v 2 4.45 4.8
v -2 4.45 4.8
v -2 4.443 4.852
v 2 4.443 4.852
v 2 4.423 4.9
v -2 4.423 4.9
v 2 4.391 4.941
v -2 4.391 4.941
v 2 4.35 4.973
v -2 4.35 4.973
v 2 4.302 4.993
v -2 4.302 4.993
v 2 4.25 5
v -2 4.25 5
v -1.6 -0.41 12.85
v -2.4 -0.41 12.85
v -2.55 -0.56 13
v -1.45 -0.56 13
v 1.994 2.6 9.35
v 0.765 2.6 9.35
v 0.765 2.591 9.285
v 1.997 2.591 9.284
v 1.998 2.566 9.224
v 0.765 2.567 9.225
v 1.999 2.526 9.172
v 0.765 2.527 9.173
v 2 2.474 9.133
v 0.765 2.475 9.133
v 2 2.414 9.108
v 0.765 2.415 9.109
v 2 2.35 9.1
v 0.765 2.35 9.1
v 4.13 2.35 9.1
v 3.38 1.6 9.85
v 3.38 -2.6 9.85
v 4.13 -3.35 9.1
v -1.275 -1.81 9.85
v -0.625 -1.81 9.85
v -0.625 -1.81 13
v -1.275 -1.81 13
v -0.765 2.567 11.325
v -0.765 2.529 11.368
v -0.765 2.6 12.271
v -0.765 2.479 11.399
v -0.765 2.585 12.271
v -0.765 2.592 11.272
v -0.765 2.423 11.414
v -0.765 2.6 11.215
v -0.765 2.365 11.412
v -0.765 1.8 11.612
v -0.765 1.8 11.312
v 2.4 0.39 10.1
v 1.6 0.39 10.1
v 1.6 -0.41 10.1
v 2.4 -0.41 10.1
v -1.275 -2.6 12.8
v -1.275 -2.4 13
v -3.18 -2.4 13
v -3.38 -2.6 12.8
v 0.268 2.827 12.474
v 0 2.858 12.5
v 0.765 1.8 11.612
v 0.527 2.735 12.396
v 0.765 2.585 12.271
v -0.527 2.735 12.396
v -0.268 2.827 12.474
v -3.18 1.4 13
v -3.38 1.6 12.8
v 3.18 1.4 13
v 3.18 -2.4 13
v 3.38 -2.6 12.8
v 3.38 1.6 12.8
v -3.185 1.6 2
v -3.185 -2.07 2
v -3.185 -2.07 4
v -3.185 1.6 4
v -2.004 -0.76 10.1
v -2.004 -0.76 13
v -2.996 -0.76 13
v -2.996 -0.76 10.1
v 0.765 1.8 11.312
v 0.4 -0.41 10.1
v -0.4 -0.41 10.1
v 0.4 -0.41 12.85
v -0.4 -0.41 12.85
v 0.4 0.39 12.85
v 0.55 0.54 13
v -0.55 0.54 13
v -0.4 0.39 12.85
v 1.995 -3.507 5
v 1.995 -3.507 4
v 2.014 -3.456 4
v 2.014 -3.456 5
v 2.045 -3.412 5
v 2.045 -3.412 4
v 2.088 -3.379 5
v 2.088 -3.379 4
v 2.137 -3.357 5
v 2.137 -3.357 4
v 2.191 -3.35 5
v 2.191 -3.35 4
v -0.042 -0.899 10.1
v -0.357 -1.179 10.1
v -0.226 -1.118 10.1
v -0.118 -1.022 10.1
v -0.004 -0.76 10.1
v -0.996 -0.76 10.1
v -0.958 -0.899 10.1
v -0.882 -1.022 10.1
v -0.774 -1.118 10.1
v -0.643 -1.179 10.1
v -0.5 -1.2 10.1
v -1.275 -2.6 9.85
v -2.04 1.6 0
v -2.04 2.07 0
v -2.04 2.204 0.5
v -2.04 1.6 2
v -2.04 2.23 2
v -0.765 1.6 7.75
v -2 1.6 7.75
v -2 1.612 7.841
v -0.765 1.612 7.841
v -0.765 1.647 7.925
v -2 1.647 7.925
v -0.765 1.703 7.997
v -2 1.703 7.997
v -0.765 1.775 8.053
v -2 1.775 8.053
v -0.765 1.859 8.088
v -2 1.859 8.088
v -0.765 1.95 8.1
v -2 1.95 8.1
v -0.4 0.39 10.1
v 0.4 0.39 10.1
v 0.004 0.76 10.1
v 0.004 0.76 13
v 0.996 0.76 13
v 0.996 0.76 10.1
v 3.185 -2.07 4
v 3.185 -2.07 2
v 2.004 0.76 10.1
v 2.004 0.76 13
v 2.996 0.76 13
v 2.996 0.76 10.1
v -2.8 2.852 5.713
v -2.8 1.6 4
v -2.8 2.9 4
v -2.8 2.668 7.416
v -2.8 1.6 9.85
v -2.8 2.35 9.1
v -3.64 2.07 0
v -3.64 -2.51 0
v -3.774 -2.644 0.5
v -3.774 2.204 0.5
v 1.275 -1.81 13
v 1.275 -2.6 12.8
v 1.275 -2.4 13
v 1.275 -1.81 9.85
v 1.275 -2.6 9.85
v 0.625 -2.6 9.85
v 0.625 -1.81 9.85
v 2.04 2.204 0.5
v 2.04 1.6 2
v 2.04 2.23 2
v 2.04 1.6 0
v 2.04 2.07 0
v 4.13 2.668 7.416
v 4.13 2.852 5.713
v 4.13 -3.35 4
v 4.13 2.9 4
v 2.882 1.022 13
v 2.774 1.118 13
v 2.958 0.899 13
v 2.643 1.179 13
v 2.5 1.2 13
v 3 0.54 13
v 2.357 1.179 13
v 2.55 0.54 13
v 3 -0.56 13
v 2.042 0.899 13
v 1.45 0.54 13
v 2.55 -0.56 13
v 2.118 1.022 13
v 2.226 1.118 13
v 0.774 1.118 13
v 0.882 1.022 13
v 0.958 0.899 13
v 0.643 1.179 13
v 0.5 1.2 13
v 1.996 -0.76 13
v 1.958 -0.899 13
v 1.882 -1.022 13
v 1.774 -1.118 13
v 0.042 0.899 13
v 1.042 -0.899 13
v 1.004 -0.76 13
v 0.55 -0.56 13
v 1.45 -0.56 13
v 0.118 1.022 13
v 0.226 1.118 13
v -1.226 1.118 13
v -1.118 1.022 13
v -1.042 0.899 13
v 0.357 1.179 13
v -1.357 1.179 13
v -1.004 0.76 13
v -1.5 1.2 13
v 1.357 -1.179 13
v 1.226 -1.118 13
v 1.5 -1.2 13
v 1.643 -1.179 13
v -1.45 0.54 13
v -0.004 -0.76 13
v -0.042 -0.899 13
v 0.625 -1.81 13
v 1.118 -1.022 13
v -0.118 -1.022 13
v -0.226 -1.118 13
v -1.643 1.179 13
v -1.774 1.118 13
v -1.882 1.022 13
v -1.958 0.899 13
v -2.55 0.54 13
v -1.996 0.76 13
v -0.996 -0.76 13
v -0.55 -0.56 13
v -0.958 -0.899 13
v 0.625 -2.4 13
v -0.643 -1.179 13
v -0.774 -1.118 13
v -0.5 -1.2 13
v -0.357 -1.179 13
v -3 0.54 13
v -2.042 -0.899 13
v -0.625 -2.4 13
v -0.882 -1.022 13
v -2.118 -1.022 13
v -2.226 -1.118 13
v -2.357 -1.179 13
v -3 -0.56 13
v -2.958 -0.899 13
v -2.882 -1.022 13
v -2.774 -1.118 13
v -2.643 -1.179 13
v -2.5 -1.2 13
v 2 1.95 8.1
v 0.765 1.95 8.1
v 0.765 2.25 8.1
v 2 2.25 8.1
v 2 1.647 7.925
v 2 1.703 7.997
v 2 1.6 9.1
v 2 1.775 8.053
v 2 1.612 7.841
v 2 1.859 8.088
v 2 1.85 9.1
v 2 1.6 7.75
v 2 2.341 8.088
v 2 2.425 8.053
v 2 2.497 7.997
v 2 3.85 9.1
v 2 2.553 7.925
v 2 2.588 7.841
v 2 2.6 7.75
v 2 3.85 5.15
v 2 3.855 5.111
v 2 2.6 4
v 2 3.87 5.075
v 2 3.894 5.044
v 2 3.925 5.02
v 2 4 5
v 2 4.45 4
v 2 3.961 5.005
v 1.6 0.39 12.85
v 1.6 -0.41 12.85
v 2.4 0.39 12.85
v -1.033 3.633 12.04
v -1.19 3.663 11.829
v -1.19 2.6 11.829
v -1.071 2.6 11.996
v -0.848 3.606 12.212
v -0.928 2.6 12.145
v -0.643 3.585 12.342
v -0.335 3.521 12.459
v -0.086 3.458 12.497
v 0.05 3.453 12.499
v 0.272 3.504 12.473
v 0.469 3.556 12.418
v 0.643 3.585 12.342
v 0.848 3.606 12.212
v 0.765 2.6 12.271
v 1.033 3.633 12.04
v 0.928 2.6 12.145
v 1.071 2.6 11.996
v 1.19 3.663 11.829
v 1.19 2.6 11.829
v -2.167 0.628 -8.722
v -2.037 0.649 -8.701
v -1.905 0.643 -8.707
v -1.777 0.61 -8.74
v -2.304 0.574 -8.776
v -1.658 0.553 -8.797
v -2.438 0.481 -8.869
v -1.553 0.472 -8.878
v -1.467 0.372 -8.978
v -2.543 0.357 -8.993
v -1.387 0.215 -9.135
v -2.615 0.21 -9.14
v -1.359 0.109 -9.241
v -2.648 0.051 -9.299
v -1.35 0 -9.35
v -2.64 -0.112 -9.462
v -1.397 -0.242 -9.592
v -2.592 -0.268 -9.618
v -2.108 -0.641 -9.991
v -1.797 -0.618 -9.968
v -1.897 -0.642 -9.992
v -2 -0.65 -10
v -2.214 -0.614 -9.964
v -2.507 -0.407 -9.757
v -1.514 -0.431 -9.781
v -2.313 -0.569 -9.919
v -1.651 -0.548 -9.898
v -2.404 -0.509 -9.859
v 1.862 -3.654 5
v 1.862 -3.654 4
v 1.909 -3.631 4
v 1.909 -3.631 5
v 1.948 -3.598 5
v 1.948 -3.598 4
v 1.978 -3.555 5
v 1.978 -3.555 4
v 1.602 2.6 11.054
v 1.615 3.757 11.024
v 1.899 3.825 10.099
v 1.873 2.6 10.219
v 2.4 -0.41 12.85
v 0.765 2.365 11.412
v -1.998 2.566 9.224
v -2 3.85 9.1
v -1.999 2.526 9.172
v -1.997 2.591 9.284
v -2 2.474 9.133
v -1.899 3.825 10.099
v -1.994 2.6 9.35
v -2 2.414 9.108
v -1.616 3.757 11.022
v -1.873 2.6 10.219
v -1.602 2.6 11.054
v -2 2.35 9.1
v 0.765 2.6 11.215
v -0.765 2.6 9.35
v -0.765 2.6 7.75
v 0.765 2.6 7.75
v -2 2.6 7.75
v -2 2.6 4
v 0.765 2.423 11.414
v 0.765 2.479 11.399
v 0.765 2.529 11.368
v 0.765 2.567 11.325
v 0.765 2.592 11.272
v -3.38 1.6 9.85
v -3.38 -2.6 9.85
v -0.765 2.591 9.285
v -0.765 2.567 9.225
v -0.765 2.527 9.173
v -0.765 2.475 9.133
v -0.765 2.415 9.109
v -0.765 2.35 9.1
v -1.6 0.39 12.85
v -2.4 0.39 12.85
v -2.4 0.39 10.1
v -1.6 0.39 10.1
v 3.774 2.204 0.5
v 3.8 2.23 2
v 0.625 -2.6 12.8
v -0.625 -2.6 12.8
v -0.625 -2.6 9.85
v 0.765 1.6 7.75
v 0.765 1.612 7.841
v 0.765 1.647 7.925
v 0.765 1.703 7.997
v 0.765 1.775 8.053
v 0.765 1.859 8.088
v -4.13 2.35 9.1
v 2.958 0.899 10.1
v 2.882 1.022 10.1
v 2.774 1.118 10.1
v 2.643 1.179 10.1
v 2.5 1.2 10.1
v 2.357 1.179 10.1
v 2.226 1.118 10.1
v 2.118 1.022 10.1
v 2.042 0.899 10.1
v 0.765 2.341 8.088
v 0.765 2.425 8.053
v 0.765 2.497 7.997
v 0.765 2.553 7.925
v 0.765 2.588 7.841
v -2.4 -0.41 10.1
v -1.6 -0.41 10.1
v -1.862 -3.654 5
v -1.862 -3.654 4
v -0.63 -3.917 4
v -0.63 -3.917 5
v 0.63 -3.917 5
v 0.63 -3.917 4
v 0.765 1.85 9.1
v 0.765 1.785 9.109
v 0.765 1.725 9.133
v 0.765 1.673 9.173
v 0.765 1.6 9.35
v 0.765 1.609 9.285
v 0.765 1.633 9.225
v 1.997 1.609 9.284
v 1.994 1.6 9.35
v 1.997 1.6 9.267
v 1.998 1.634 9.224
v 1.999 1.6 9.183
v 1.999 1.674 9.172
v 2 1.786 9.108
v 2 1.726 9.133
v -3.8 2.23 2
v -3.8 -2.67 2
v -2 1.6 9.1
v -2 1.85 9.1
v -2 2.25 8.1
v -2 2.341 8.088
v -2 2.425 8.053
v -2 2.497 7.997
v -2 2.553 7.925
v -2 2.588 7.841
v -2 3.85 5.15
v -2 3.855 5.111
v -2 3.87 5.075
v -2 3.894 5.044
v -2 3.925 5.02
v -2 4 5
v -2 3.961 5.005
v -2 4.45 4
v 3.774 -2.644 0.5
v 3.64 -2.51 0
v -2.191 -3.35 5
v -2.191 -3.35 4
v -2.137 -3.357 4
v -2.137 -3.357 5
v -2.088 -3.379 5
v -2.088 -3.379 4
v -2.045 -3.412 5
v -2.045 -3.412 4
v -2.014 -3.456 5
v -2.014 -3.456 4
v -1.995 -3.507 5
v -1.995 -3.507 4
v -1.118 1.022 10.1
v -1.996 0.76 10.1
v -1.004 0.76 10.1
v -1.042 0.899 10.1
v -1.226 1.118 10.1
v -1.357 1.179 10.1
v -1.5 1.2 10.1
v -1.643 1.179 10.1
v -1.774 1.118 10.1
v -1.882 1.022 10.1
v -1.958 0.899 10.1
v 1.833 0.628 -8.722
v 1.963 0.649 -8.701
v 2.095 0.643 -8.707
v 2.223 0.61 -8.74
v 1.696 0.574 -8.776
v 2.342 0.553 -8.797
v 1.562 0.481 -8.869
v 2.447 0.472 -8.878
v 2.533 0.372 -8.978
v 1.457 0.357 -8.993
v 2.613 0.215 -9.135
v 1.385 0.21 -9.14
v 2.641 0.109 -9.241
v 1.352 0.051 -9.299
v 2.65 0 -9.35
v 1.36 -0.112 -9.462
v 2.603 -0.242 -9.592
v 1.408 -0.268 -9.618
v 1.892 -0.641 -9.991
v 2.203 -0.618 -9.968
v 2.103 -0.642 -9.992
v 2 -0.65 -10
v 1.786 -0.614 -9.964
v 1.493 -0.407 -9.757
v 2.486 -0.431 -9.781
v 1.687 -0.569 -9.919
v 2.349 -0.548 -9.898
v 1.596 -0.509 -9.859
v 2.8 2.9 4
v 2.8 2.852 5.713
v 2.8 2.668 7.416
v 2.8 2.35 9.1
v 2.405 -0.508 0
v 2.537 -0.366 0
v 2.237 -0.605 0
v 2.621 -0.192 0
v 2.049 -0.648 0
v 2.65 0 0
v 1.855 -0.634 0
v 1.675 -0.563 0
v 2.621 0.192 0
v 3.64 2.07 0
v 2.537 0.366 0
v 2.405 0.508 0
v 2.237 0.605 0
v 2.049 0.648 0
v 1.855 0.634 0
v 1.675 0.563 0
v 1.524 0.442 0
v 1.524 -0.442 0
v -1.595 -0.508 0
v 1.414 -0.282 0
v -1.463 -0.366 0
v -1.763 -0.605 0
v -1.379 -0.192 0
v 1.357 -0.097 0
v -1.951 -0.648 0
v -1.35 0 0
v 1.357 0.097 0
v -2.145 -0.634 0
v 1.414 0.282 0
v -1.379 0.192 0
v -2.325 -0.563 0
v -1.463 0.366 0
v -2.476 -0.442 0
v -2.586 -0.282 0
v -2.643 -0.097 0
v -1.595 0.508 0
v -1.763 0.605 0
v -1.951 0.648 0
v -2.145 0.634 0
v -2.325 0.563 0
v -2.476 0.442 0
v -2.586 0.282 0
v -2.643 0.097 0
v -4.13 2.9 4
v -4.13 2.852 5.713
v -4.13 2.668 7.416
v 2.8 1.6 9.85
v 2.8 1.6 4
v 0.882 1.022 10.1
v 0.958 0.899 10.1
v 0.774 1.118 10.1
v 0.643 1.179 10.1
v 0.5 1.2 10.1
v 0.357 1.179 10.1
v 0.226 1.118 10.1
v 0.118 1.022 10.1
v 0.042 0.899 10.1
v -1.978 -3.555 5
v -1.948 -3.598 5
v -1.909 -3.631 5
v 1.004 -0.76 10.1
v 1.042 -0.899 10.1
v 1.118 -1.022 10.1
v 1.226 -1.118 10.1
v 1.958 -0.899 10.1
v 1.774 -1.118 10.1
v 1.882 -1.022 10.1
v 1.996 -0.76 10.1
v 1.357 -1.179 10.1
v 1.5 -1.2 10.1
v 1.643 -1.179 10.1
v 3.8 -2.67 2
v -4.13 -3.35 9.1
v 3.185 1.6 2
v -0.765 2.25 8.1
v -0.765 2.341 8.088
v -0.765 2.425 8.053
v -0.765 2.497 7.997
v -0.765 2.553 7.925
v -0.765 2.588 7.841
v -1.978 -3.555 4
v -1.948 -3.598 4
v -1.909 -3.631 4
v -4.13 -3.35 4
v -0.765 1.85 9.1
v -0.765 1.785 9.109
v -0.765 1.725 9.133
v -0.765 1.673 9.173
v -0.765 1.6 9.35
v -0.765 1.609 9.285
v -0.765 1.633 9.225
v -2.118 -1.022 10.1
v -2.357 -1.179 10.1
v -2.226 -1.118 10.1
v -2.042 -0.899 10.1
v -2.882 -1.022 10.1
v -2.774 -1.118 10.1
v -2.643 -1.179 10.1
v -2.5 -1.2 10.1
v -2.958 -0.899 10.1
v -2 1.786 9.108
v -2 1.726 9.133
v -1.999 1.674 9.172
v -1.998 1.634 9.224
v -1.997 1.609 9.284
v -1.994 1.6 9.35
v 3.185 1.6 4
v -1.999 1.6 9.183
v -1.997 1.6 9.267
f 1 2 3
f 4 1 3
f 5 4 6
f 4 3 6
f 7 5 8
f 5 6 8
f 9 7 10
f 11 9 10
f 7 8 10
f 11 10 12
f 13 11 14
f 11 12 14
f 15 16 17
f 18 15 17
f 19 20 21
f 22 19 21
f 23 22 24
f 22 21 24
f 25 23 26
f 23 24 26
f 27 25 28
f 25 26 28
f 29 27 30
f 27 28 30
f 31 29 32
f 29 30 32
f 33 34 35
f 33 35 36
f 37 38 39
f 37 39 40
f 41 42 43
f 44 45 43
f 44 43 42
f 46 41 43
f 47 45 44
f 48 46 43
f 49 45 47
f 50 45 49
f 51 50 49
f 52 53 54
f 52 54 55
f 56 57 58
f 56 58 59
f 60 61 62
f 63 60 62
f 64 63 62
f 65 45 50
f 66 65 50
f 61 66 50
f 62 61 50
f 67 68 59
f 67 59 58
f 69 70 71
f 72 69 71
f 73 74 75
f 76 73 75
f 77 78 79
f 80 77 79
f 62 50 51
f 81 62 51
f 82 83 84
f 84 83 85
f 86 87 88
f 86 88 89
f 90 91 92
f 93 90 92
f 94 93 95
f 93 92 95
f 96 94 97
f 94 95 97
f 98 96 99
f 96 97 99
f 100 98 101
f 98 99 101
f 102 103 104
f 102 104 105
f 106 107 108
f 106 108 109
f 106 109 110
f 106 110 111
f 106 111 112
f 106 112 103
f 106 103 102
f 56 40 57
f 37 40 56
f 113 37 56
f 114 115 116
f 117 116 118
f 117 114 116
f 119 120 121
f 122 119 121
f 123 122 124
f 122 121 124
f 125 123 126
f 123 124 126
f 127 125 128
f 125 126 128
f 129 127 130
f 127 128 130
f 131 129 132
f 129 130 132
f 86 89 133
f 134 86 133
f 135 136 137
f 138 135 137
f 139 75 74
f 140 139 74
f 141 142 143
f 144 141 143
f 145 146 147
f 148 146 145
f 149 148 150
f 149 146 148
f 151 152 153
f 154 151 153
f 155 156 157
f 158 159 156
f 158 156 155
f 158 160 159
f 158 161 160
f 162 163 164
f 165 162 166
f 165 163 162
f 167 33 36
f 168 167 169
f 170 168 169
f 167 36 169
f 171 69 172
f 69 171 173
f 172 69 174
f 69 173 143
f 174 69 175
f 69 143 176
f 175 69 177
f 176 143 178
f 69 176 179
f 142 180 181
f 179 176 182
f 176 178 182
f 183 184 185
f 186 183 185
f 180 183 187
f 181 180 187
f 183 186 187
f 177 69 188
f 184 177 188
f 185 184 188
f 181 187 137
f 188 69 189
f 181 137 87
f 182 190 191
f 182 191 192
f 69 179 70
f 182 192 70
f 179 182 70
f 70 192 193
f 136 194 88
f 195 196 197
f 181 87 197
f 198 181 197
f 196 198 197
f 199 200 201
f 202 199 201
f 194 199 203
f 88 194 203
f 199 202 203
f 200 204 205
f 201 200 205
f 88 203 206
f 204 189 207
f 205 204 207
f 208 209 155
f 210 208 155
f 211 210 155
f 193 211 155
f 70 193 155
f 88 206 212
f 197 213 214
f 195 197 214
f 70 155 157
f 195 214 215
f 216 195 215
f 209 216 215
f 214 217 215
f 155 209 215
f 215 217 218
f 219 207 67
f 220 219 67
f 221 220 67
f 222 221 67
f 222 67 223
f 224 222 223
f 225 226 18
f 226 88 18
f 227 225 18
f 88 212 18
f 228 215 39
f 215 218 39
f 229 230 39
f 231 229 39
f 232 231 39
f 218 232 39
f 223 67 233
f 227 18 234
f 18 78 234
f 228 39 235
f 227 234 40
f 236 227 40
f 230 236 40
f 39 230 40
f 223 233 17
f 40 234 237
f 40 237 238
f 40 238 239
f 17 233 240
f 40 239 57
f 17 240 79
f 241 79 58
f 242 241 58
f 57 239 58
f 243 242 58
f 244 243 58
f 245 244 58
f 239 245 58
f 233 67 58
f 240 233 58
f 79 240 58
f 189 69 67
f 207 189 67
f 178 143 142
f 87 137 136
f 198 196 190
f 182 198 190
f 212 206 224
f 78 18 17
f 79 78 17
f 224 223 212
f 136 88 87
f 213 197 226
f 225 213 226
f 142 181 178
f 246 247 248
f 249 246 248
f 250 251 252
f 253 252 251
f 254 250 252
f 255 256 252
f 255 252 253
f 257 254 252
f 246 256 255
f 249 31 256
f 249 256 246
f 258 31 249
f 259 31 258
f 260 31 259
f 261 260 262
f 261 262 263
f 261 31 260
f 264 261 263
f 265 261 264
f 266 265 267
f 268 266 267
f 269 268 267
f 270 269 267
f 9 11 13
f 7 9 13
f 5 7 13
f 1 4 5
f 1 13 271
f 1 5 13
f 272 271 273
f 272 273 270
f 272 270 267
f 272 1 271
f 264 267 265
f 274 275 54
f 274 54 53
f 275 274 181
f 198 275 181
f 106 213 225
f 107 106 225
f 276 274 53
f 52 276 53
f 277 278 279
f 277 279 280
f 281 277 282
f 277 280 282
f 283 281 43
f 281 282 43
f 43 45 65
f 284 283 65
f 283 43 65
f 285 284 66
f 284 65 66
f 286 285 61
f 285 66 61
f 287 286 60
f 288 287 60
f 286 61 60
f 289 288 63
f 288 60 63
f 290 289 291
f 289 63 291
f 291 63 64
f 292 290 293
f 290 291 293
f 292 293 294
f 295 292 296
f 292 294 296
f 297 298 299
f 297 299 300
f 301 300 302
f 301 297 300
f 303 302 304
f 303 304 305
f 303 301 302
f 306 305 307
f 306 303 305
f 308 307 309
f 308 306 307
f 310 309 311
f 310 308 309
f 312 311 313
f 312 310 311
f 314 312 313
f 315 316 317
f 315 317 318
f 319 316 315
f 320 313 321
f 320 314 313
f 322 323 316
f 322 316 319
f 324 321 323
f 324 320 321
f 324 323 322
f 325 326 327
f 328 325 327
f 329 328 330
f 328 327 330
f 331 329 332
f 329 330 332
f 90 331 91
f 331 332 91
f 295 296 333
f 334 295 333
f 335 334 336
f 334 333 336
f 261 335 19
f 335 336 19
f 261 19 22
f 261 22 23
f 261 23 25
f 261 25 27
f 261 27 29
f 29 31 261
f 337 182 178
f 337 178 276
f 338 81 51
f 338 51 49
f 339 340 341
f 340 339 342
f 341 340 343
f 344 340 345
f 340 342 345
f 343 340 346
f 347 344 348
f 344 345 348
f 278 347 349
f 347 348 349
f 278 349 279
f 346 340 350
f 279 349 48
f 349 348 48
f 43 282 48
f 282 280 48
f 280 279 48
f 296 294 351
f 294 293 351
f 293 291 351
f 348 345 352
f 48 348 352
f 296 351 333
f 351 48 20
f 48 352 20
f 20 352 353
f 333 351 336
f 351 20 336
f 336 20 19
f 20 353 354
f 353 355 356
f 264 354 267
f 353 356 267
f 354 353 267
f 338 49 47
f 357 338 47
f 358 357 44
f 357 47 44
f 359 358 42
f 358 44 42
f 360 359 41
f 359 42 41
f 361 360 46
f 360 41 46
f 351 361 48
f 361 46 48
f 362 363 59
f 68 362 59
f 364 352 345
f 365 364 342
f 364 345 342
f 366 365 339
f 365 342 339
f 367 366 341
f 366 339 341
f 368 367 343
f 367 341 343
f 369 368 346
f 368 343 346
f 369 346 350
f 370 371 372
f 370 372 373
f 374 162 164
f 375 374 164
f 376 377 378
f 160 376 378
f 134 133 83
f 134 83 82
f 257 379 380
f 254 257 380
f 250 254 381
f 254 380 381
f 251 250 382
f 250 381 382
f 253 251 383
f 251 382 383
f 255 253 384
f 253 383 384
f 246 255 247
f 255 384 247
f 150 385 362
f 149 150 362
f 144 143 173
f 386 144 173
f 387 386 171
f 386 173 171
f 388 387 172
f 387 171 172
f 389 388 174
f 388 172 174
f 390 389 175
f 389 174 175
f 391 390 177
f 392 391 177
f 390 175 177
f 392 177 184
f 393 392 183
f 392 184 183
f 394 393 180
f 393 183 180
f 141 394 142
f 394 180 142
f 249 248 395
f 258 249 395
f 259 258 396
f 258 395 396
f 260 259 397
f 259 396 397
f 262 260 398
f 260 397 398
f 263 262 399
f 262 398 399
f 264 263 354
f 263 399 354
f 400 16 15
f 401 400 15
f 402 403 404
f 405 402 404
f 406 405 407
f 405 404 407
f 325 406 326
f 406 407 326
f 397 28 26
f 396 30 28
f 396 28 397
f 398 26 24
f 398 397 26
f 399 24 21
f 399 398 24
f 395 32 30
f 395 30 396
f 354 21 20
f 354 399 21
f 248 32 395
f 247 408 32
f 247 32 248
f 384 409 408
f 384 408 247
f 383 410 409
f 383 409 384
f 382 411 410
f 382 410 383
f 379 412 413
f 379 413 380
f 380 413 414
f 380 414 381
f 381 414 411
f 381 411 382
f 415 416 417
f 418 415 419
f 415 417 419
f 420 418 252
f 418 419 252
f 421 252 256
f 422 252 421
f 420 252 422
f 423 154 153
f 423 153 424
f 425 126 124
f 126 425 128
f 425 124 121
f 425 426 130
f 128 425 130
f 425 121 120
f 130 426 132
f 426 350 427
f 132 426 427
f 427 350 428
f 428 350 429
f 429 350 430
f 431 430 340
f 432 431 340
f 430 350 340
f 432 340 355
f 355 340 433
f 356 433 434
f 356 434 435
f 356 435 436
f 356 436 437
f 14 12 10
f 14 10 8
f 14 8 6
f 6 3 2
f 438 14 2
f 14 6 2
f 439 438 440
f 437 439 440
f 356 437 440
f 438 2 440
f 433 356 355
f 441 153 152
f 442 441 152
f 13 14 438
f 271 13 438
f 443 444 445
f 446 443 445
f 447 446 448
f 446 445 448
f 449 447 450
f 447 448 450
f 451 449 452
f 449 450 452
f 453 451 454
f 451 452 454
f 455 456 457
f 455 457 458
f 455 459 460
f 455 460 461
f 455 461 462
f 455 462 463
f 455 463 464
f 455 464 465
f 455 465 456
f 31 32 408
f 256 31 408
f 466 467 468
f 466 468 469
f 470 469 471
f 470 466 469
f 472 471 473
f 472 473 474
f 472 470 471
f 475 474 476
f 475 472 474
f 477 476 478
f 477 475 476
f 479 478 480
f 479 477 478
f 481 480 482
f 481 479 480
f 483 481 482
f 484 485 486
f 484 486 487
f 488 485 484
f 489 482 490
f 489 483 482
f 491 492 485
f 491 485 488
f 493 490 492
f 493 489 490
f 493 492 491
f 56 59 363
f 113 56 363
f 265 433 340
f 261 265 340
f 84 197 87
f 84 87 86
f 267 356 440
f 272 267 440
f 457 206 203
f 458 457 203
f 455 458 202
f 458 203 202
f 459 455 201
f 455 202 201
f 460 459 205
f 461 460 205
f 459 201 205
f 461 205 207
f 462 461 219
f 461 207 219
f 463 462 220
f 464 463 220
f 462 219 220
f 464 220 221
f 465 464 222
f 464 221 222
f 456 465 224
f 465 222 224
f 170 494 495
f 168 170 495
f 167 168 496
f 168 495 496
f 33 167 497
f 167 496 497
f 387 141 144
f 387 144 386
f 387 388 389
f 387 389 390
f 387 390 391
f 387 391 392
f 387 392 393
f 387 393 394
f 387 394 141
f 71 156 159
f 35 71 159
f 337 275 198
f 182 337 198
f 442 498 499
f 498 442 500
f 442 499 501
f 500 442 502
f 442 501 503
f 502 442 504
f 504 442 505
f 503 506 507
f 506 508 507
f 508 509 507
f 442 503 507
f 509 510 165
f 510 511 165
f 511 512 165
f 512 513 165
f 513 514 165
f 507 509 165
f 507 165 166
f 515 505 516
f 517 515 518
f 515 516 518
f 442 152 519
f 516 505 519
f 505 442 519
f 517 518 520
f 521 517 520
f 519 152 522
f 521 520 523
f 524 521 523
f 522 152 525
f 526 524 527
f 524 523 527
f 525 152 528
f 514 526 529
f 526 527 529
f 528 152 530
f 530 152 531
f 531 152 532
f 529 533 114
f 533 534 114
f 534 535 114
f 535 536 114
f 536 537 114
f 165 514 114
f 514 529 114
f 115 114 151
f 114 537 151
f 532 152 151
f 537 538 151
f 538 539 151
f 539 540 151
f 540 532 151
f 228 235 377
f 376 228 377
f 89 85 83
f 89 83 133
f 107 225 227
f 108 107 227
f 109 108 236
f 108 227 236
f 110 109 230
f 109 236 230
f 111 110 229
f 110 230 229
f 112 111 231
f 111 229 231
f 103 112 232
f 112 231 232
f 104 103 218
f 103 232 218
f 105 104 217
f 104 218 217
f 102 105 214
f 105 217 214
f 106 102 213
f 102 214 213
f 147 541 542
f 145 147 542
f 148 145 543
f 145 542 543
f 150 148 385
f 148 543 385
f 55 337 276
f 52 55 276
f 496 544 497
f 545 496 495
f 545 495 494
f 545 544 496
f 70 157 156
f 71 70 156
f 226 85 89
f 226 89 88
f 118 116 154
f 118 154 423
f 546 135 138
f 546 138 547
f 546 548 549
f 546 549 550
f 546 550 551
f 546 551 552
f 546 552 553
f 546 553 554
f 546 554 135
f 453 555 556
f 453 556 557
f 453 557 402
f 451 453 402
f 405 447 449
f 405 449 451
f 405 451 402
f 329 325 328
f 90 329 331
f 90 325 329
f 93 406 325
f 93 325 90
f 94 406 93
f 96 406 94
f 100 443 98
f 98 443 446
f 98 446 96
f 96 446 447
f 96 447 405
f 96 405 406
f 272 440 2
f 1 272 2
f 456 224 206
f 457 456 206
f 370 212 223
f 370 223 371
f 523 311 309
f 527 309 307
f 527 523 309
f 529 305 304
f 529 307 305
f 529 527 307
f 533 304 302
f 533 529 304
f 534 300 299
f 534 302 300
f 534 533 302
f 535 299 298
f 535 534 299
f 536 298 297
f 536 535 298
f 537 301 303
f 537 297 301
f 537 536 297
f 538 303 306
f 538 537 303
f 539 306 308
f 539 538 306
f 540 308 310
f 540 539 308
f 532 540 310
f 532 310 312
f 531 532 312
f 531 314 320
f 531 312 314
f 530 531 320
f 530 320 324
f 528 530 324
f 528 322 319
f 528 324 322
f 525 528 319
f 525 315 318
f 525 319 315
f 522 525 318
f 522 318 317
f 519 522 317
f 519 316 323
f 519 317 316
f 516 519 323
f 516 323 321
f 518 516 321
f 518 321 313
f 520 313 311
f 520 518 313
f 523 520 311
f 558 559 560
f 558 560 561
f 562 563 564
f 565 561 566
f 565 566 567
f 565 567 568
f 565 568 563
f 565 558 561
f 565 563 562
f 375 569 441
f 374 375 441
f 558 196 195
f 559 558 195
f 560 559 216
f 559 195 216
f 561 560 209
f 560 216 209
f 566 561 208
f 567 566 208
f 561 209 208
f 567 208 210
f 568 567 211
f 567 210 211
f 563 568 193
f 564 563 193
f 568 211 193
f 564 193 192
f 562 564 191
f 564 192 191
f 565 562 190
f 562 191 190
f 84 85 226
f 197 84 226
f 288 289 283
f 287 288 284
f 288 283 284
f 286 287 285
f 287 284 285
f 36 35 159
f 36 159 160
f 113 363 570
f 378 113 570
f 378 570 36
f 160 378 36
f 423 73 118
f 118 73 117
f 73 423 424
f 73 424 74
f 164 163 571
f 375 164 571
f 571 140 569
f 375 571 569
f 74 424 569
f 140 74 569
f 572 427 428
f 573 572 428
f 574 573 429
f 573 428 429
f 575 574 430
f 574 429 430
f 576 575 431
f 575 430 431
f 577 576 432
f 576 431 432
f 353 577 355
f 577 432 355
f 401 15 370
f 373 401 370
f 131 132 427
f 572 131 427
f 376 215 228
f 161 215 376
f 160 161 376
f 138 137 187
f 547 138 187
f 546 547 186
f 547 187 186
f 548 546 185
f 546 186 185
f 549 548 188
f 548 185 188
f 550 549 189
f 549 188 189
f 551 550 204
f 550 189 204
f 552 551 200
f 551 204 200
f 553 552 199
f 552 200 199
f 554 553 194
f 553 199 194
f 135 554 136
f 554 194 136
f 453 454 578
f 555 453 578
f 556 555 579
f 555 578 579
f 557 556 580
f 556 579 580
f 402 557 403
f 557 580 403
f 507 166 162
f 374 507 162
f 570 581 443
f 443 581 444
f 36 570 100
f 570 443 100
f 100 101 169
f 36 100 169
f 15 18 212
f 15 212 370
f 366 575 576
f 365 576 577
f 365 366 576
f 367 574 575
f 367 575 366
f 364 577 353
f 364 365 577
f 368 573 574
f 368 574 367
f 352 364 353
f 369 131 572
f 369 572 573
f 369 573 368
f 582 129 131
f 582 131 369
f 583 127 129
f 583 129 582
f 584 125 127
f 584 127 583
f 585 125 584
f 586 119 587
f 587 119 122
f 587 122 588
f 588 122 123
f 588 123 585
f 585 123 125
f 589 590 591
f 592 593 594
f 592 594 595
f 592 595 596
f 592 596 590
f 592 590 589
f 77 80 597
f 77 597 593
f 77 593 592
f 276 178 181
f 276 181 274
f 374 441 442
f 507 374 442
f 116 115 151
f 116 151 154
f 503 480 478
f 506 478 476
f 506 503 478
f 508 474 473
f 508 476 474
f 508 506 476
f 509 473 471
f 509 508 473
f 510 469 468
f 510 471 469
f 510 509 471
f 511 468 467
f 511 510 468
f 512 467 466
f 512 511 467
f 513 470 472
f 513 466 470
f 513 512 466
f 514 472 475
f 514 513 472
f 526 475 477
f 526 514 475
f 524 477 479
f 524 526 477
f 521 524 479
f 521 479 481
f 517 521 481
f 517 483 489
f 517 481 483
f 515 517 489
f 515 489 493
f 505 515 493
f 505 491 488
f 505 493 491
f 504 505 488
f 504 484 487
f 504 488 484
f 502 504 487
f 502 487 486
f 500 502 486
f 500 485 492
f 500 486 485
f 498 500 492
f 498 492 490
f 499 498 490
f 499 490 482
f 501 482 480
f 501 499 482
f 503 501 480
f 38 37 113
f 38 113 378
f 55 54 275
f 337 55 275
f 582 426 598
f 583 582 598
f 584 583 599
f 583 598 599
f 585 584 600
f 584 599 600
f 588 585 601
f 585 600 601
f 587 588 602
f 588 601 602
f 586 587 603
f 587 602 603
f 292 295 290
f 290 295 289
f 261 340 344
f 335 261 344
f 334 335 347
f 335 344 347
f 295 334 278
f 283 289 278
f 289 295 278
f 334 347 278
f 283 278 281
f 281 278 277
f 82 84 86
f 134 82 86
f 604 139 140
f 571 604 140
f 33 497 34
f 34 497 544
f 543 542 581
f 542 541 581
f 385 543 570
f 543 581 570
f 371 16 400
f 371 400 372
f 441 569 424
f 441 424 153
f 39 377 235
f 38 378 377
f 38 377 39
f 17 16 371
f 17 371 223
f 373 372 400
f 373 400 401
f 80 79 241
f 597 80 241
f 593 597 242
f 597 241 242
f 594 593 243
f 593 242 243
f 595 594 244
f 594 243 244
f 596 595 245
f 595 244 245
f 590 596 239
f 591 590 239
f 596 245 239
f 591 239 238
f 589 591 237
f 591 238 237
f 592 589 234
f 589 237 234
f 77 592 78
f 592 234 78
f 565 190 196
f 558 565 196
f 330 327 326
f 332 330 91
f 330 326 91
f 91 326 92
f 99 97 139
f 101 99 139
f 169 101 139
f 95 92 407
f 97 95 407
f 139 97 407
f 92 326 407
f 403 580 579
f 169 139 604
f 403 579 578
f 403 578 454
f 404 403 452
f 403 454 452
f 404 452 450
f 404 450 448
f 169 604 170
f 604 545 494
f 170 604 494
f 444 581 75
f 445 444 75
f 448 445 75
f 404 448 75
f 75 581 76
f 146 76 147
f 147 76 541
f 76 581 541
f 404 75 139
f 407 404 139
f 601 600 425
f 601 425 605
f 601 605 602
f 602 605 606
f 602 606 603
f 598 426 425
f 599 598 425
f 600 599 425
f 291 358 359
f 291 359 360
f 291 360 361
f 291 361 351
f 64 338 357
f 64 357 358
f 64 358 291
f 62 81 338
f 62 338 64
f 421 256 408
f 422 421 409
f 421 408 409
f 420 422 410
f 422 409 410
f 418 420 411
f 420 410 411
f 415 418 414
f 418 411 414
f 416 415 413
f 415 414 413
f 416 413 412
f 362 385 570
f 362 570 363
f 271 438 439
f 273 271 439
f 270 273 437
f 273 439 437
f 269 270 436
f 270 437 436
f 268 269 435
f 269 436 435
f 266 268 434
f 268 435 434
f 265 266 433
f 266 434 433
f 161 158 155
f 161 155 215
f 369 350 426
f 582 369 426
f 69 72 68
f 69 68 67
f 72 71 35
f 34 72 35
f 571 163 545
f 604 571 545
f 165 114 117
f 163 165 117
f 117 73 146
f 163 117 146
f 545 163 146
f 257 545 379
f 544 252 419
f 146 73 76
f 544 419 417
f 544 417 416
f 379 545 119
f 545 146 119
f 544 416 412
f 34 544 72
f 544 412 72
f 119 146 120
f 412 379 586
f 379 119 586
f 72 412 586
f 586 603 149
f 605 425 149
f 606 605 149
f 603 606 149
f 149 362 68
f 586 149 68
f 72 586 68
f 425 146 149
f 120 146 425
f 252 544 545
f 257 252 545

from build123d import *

# Parameters (mm, degrees)
BOSS_EXTRUDE1_DEPTH      = 4.15
BOSS_EXTRUDE1_DEPTH_BACK = 4.15
CUT_EXTRUDE1_DEPTH       = 6
CUT_EXTRUDE1_DEPTH_BACK  = 6
SKETCH2_W                = 10
SKETCH2_H                = 15
CUT_EXTRUDE2_DEPTH       = 2
BOSS_EXTRUDE2_DEPTH      = 2
BOSS_EXTRUDE2_DEPTH_BACK = 2
SKETCH5_W                = 4.4
SKETCH5_H                = 9
CUT_EXTRUDE3_DEPTH       = 3
CUT_EXTRUDE4_DEPTH       = 1
BOSS_EXTRUDE3_DEPTH      = 1
CUT_EXTRUDE5_DEPTH       = 3.2
SKETCH9_W                = 0.8
SKETCH9_H                = 0.8
CUT_EXTRUDE6_DEPTH       = 2.9
SKETCH10_W               = 0.8
SKETCH10_H               = 0.8
CUT_EXTRUDE7_DEPTH       = 2.9
SKETCH11_W               = 0.8
SKETCH11_H               = 0.8
CUT_EXTRUDE8_DEPTH       = 2.9
CUT_EXTRUDE9_DEPTH       = 2.9
CUT_EXTRUDE10_DEPTH      = 2.9
CUT_EXTRUDE11_DEPTH      = 2.9
CUT_EXTRUDE12_DEPTH      = 2.9
CUT_EXTRUDE13_DEPTH      = 2.9
CUT_EXTRUDE14_DEPTH      = 2.9
CUT_EXTRUDE15_DEPTH      = 1.1
BOSS_EXTRUDE4_DEPTH      = 3
BOSS_EXTRUDE4_DEPTH_BACK = 3
SKETCH20_R               = 0.65
BOSS_EXTRUDE5_DEPTH      = 10
SKETCH21_R               = 0.65
BOSS_EXTRUDE6_DEPTH      = 10
CUT_EXTRUDE16_DEPTH      = 3
CUT_EXTRUDE16_DEPTH_BACK = 3


with BuildPart() as part:
    # Sketch1 → Boss-Extrude1 (new, two sides: drawn at the far end of the back side and taken through both)
    with BuildSketch(Plane(origin=(0, 0, 0), x_dir=(0, 0, -1), z_dir=(1, 0, 0)).offset(-BOSS_EXTRUDE1_DEPTH_BACK)):
        with BuildLine():
            Line((-13, 1.4), (-13, -2.4))
            Line((-13, -2.4), (-12.8, -2.6))
            Line((-12.8, -2.6), (-9.85, -2.6))
            Line((-9.85, -2.6), (-9.1, -3.35))
            Line((-9.1, -3.35), (-4, -3.35))
            Line((-4, -3.35), (-4, -2.07))
            Line((-4, -2.07), (-2, -2.07))
            Line((-2, -2.07), (-2, -2.67))
            Line((-2, -2.67), (-0.5, -2.643817403))
            Line((-0.5, -2.643817403), (0, -2.509842806))
            Line((0, -2.509842806), (0, 2.069842806))
            Line((0, 2.069842806), (-0.5, 2.203817403))
            Line((-0.5, 2.203817403), (-2, 2.23))
            Line((-2, 2.23), (-2, 1.6))
            Line((-2, 1.6), (-4, 1.6))
            Line((-4, 1.6), (-4, 2.9))
            ThreePointArc((-4, 2.9), (-6.566392361, 2.777001893), (-9.1, 2.35))
            Line((-9.1, 2.35), (-9.85, 1.6))
            Line((-9.85, 1.6), (-12.8, 1.6))
            Line((-12.8, 1.6), (-13, 1.4))
        make_face()
    extrude(amount=BOSS_EXTRUDE1_DEPTH + BOSS_EXTRUDE1_DEPTH_BACK)

    # Sketch2 → Cut-Extrude1 (cut, two sides: drawn at the far end of the back side and taken through both)
    with BuildSketch(Plane(origin=(0, 0, 0), x_dir=(1, 0, 0), z_dir=(0, 1, 0)).offset(-CUT_EXTRUDE1_DEPTH_BACK)):
        with Locations((0, -6.5)):
            Rectangle(SKETCH2_W, SKETCH2_H)
        Polygon((-4.13, -9.1), (-3.38, -9.85), (-3.38, -12.8), (-3.18, -13), (3.18, -13), (3.38, -12.8), (3.38, -9.85), (4.13, -9.1), (4.13, -4), (3.185, -4), (3.185, -2), (3.8, -2), (3.773817403, -0.5), (3.639842806, 0), (-3.639842806, 0), (-3.773817403, -0.5), (-3.8, -2), (-3.185, -2), (-3.185, -4), (-4.13, -4), align=None, mode=Mode.SUBTRACT)
    extrude(amount=CUT_EXTRUDE1_DEPTH + CUT_EXTRUDE1_DEPTH_BACK, mode=Mode.SUBTRACT)

    # Sketch3 → Cut-Extrude2 (cut)
    with BuildSketch(Plane(origin=(0, 1.6, 0), x_dir=(1, 0, 0), z_dir=(0, 1, 0))):
        Polygon((-2.8, -4), (-2.8, -13), (2.8, -13), (2.8, -4), (2.04, -4), (2.04, 0), (-2.04, 0), (-2.04, -4), align=None)
    extrude(amount=CUT_EXTRUDE2_DEPTH, mode=Mode.SUBTRACT)

    # Sketch4 → Boss-Extrude2 (add, two sides: drawn at the far end of the back side and taken through both)
    with BuildSketch(Plane(origin=(0, 0, 0), x_dir=(0, 0, -1), z_dir=(1, 0, 0)).offset(-BOSS_EXTRUDE2_DEPTH_BACK)):
        with BuildLine():
            Line((-12.51, 3.388062852), (-12.51, 2.87))
            Line((-12.51, 2.87), (-11.612163395, 1.8))
            Line((-11.612163395, 1.8), (-11.312163395, 1.8))
            Line((-11.312163395, 1.8), (-11.411835811, 2.365270364))
            ThreePointArc((-11.411835811, 2.365270364), (-11.368083149, 2.528557522), (-11.214874261, 2.6))
            Line((-11.214874261, 2.6), (-9.35, 2.6))
            ThreePointArc((-9.35, 2.6), (-9.173223305, 2.526776695), (-9.1, 2.35))
            Line((-9.1, 2.35), (-9.1, 1.85))
            ThreePointArc((-9.1, 1.85), (-9.173223305, 1.673223305), (-9.35, 1.6))
            Line((-9.35, 1.6), (-9.35, 0.6))
            Line((-9.35, 0.6), (-7.75, 0.6))
            Line((-7.75, 0.6), (-7.75, 1.6))
            ThreePointArc((-7.75, 1.6), (-7.997487373, 1.702512627), (-8.1, 1.95))
            Line((-8.1, 1.95), (-8.1, 2.25))
            ThreePointArc((-8.1, 2.25), (-7.997487373, 2.497487373), (-7.75, 2.6))
            Line((-7.75, 2.6), (-4, 2.6))
            Line((-4, 2.6), (-4, 4.45))
            Line((-4, 4.45), (-4.8, 4.45))
            ThreePointArc((-4.8, 4.45), (-4.941421356, 4.391421356), (-5, 4.25))
            Line((-5, 4.25), (-5, 4))
            ThreePointArc((-5, 4), (-5.043933983, 3.893933983), (-5.15, 3.85))
            Line((-5.15, 3.85), (-9.1, 3.85))
            ThreePointArc((-9.1, 3.85), (-10.726600682, 3.783744511), (-12.342424242, 3.585417022))
            ThreePointArc((-12.342424242, 3.585417022), (-12.462454663, 3.517513907), (-12.51, 3.388062852))
        make_face()
    extrude(amount=BOSS_EXTRUDE2_DEPTH + BOSS_EXTRUDE2_DEPTH_BACK)

    # Sketch5 → Cut-Extrude3 (cut)
    with BuildSketch(Plane(origin=(0, 1.6, 0), x_dir=(1, 0, 0), z_dir=(0, 1, 0))):
        with Locations((0, -8.3)):
            Rectangle(SKETCH5_W, SKETCH5_H)
        with BuildLine():
            Line((2, -9.1), (2, -4))
            Line((2, -4), (-2, -4))
            Line((-2, -4), (-2, -9.1))
            ThreePointArc((-2, -9.1), (-1.793181663, -10.523168838), (-1.189836183, -11.828602712))
            ThreePointArc((-1.189836183, -11.828602712), (0, -12.5), (1.189836183, -11.828602712))
            ThreePointArc((1.189836183, -11.828602712), (1.793181663, -10.523168838), (2, -9.1))
        make_face(mode=Mode.SUBTRACT)
    extrude(amount=CUT_EXTRUDE3_DEPTH, mode=Mode.SUBTRACT)

    # Sketch6 → Cut-Extrude4 (cut)
    with BuildSketch(Plane(origin=(0, 1.6, 0), x_dir=(1, 0, 0), z_dir=(0, 1, 0))):
        Polygon((-2, -10.5), (-2, -13), (-0.765, -13), (-0.765, -10.7), (0.765, -10.7), (0.765, -13), (2, -13), (2, -10.5), (0.765, -10.5), (0.765, -4), (2, -4), (2, -3), (-2, -3), (-2, -4), (-0.765, -4), (-0.765, -10.5), align=None)
    extrude(amount=CUT_EXTRUDE4_DEPTH, mode=Mode.SUBTRACT)

    # Sketch7 → Boss-Extrude3 (add)
    with BuildSketch(Plane.XY.offset(4)):
        with BuildLine():
            Line((-2.3, -3.35), (-2.190561659, -3.35))
            ThreePointArc((-2.190561659, -3.35), (-2.065337959, -3.394054417), (-1.995280829, -3.50680975))
            ThreePointArc((-1.995280829, -3.50680975), (-1.948171085, -3.597952406), (-1.862068966, -3.653744311))
            ThreePointArc((-1.862068966, -3.653744311), (0, -3.95), (1.862068966, -3.653744311))
            ThreePointArc((1.862068966, -3.653744311), (1.948171087, -3.597952405), (1.99528083, -3.506809747))
            ThreePointArc((1.99528083, -3.506809747), (2.06533796, -3.394054416), (2.190561659, -3.35))
            Line((2.190561659, -3.35), (2.3, -3.35))
            Line((2.3, -3.35), (2, 0))
            Line((2, 0), (-2, 0))
            Line((-2, 0), (-2.3, -3.35))
        make_face()
    extrude(amount=BOSS_EXTRUDE3_DEPTH)

    # Sketch8 → Cut-Extrude5 (cut)
    with BuildSketch(Plane.XY.offset(9.85)):
        Polygon((-1.275, -1.81), (-1.275, -3.41), (1.275, -3.41), (1.275, -1.81), (0.625, -1.81), (0.625, -2.61), (-0.625, -2.61), (-0.625, -1.81), align=None)
    extrude(amount=CUT_EXTRUDE5_DEPTH, mode=Mode.SUBTRACT)

    # Sketch9 → Cut-Extrude6 (cut)
    with BuildSketch(Plane.XY.offset(13)):
        with Locations((-2, -0.01)):
            Rectangle(SKETCH9_W, SKETCH9_H)
    extrude(amount=-CUT_EXTRUDE6_DEPTH, mode=Mode.SUBTRACT)

    # Sketch10 → Cut-Extrude7 (cut)
    with BuildSketch(Plane.XY.offset(13)):
        with Locations((0, -0.01)):
            Rectangle(SKETCH10_W, SKETCH10_H)
    extrude(amount=-CUT_EXTRUDE7_DEPTH, mode=Mode.SUBTRACT)

    # Sketch11 → Cut-Extrude8 (cut)
    with BuildSketch(Plane.XY.offset(13)):
        with Locations((2, -0.01)):
            Rectangle(SKETCH11_W, SKETCH11_H)
    extrude(amount=-CUT_EXTRUDE8_DEPTH, mode=Mode.SUBTRACT)

    # Sketch12 → Cut-Extrude9 (cut)
    with BuildSketch(Plane.XY.offset(13)):
        with BuildLine():
            Line((-2.003613054, -0.76), (-2.996386946, -0.76))
            ThreePointArc((-2.996386946, -0.76), (-2.5, -1.2), (-2.003613054, -0.76))
        make_face()
    extrude(amount=-CUT_EXTRUDE9_DEPTH, mode=Mode.SUBTRACT)

    # Sketch13 → Cut-Extrude10 (cut)
    with BuildSketch(Plane.XY.offset(13)):
        with BuildLine():
            Line((0.003613054, 0.76), (0.996386946, 0.76))
            ThreePointArc((0.996386946, 0.76), (0.5, 1.2), (0.003613054, 0.76))
        make_face()
    extrude(amount=-CUT_EXTRUDE10_DEPTH, mode=Mode.SUBTRACT)

    # Sketch14 → Cut-Extrude11 (cut)
    with BuildSketch(Plane.XY.offset(13)):
        with BuildLine():
            Line((2.003613054, 0.76), (2.996386946, 0.76))
            ThreePointArc((2.996386946, 0.76), (2.5, 1.2), (2.003613054, 0.76))
        make_face()
    extrude(amount=-CUT_EXTRUDE11_DEPTH, mode=Mode.SUBTRACT)

    # Sketch15 → Cut-Extrude12 (cut)
    with BuildSketch(Plane.XY.offset(13)):
        with BuildLine():
            Line((-1.996386946, 0.76), (-1.003613054, 0.76))
            ThreePointArc((-1.003613054, 0.76), (-1.5, 1.2), (-1.996386946, 0.76))
        make_face()
    extrude(amount=-CUT_EXTRUDE12_DEPTH, mode=Mode.SUBTRACT)

    # Sketch16 → Cut-Extrude13 (cut)
    with BuildSketch(Plane.XY.offset(13)):
        with BuildLine():
            Line((-0.003613054, -0.76), (-0.996386946, -0.76))
            ThreePointArc((-0.996386946, -0.76), (-0.5, -1.2), (-0.003613054, -0.76))
        make_face()
    extrude(amount=-CUT_EXTRUDE13_DEPTH, mode=Mode.SUBTRACT)

    # Sketch17 → Cut-Extrude14 (cut)
    with BuildSketch(Plane.XY.offset(13)):
        with BuildLine():
            Line((1.996386946, -0.76), (1.003613054, -0.76))
            ThreePointArc((1.003613054, -0.76), (1.5, -1.2), (1.996386946, -0.76))
        make_face()
    extrude(amount=-CUT_EXTRUDE14_DEPTH, mode=Mode.SUBTRACT)

    # Sketch18 → Cut-Extrude15 (cut)
    with BuildSketch(Plane(origin=(0, -0.56, 0), x_dir=(1, 0, 0), z_dir=(0, 1, 0))):
        Polygon((-2.55, -13), (-2.55, -13.5), (2.55, -13.5), (2.55, -13), (2.05, -12.5), (1.95, -12.5), (1.45, -13), (0.55, -13), (0.05, -12.5), (-0.05, -12.5), (-0.55, -13), (-1.45, -13), (-1.95, -12.5), (-2.05, -12.5), align=None)
    extrude(amount=CUT_EXTRUDE15_DEPTH, mode=Mode.SUBTRACT)

    # Sketch19 → Boss-Extrude4 (add, two sides: drawn at the far end of the back side and taken through both)
    with BuildSketch(Plane(origin=(0, 0, 0), x_dir=(0, 0, -1), z_dir=(1, 0, 0)).offset(-BOSS_EXTRUDE4_DEPTH_BACK)):
        Polygon((-13, 0.54), (-12.85, 0.39), (-8.1, 0.39), (-8.1, -0.41), (-12.85, -0.41), (-13, -0.56), (-8, -0.56), (-8, 0.54), align=None)
    extrude(amount=BOSS_EXTRUDE4_DEPTH + BOSS_EXTRUDE4_DEPTH_BACK)

    # Sketch20 → Boss-Extrude5 (add)
    with BuildSketch(Plane.XY):
        with Locations((2, 0)):
            Circle(SKETCH20_R)
    extrude(amount=-BOSS_EXTRUDE5_DEPTH)

    # Sketch21 → Boss-Extrude6 (add)
    with BuildSketch(Plane.XY):
        with Locations((-2, 0)):
            Circle(SKETCH21_R)
    extrude(amount=-BOSS_EXTRUDE6_DEPTH)

    # Sketch22 → Cut-Extrude16 (cut, two sides: drawn at the far end of the back side and taken through both)
    with BuildSketch(Plane(origin=(0, 0, 0), x_dir=(0, 0, -1), z_dir=(1, 0, 0)).offset(-CUT_EXTRUDE16_DEPTH_BACK)):
        Polygon((8.5, 0.85), (10, -0.65), (10, 0.85), align=None)
    extrude(amount=CUT_EXTRUDE16_DEPTH + CUT_EXTRUDE16_DEPTH_BACK, mode=Mode.SUBTRACT)


solid = part.part
